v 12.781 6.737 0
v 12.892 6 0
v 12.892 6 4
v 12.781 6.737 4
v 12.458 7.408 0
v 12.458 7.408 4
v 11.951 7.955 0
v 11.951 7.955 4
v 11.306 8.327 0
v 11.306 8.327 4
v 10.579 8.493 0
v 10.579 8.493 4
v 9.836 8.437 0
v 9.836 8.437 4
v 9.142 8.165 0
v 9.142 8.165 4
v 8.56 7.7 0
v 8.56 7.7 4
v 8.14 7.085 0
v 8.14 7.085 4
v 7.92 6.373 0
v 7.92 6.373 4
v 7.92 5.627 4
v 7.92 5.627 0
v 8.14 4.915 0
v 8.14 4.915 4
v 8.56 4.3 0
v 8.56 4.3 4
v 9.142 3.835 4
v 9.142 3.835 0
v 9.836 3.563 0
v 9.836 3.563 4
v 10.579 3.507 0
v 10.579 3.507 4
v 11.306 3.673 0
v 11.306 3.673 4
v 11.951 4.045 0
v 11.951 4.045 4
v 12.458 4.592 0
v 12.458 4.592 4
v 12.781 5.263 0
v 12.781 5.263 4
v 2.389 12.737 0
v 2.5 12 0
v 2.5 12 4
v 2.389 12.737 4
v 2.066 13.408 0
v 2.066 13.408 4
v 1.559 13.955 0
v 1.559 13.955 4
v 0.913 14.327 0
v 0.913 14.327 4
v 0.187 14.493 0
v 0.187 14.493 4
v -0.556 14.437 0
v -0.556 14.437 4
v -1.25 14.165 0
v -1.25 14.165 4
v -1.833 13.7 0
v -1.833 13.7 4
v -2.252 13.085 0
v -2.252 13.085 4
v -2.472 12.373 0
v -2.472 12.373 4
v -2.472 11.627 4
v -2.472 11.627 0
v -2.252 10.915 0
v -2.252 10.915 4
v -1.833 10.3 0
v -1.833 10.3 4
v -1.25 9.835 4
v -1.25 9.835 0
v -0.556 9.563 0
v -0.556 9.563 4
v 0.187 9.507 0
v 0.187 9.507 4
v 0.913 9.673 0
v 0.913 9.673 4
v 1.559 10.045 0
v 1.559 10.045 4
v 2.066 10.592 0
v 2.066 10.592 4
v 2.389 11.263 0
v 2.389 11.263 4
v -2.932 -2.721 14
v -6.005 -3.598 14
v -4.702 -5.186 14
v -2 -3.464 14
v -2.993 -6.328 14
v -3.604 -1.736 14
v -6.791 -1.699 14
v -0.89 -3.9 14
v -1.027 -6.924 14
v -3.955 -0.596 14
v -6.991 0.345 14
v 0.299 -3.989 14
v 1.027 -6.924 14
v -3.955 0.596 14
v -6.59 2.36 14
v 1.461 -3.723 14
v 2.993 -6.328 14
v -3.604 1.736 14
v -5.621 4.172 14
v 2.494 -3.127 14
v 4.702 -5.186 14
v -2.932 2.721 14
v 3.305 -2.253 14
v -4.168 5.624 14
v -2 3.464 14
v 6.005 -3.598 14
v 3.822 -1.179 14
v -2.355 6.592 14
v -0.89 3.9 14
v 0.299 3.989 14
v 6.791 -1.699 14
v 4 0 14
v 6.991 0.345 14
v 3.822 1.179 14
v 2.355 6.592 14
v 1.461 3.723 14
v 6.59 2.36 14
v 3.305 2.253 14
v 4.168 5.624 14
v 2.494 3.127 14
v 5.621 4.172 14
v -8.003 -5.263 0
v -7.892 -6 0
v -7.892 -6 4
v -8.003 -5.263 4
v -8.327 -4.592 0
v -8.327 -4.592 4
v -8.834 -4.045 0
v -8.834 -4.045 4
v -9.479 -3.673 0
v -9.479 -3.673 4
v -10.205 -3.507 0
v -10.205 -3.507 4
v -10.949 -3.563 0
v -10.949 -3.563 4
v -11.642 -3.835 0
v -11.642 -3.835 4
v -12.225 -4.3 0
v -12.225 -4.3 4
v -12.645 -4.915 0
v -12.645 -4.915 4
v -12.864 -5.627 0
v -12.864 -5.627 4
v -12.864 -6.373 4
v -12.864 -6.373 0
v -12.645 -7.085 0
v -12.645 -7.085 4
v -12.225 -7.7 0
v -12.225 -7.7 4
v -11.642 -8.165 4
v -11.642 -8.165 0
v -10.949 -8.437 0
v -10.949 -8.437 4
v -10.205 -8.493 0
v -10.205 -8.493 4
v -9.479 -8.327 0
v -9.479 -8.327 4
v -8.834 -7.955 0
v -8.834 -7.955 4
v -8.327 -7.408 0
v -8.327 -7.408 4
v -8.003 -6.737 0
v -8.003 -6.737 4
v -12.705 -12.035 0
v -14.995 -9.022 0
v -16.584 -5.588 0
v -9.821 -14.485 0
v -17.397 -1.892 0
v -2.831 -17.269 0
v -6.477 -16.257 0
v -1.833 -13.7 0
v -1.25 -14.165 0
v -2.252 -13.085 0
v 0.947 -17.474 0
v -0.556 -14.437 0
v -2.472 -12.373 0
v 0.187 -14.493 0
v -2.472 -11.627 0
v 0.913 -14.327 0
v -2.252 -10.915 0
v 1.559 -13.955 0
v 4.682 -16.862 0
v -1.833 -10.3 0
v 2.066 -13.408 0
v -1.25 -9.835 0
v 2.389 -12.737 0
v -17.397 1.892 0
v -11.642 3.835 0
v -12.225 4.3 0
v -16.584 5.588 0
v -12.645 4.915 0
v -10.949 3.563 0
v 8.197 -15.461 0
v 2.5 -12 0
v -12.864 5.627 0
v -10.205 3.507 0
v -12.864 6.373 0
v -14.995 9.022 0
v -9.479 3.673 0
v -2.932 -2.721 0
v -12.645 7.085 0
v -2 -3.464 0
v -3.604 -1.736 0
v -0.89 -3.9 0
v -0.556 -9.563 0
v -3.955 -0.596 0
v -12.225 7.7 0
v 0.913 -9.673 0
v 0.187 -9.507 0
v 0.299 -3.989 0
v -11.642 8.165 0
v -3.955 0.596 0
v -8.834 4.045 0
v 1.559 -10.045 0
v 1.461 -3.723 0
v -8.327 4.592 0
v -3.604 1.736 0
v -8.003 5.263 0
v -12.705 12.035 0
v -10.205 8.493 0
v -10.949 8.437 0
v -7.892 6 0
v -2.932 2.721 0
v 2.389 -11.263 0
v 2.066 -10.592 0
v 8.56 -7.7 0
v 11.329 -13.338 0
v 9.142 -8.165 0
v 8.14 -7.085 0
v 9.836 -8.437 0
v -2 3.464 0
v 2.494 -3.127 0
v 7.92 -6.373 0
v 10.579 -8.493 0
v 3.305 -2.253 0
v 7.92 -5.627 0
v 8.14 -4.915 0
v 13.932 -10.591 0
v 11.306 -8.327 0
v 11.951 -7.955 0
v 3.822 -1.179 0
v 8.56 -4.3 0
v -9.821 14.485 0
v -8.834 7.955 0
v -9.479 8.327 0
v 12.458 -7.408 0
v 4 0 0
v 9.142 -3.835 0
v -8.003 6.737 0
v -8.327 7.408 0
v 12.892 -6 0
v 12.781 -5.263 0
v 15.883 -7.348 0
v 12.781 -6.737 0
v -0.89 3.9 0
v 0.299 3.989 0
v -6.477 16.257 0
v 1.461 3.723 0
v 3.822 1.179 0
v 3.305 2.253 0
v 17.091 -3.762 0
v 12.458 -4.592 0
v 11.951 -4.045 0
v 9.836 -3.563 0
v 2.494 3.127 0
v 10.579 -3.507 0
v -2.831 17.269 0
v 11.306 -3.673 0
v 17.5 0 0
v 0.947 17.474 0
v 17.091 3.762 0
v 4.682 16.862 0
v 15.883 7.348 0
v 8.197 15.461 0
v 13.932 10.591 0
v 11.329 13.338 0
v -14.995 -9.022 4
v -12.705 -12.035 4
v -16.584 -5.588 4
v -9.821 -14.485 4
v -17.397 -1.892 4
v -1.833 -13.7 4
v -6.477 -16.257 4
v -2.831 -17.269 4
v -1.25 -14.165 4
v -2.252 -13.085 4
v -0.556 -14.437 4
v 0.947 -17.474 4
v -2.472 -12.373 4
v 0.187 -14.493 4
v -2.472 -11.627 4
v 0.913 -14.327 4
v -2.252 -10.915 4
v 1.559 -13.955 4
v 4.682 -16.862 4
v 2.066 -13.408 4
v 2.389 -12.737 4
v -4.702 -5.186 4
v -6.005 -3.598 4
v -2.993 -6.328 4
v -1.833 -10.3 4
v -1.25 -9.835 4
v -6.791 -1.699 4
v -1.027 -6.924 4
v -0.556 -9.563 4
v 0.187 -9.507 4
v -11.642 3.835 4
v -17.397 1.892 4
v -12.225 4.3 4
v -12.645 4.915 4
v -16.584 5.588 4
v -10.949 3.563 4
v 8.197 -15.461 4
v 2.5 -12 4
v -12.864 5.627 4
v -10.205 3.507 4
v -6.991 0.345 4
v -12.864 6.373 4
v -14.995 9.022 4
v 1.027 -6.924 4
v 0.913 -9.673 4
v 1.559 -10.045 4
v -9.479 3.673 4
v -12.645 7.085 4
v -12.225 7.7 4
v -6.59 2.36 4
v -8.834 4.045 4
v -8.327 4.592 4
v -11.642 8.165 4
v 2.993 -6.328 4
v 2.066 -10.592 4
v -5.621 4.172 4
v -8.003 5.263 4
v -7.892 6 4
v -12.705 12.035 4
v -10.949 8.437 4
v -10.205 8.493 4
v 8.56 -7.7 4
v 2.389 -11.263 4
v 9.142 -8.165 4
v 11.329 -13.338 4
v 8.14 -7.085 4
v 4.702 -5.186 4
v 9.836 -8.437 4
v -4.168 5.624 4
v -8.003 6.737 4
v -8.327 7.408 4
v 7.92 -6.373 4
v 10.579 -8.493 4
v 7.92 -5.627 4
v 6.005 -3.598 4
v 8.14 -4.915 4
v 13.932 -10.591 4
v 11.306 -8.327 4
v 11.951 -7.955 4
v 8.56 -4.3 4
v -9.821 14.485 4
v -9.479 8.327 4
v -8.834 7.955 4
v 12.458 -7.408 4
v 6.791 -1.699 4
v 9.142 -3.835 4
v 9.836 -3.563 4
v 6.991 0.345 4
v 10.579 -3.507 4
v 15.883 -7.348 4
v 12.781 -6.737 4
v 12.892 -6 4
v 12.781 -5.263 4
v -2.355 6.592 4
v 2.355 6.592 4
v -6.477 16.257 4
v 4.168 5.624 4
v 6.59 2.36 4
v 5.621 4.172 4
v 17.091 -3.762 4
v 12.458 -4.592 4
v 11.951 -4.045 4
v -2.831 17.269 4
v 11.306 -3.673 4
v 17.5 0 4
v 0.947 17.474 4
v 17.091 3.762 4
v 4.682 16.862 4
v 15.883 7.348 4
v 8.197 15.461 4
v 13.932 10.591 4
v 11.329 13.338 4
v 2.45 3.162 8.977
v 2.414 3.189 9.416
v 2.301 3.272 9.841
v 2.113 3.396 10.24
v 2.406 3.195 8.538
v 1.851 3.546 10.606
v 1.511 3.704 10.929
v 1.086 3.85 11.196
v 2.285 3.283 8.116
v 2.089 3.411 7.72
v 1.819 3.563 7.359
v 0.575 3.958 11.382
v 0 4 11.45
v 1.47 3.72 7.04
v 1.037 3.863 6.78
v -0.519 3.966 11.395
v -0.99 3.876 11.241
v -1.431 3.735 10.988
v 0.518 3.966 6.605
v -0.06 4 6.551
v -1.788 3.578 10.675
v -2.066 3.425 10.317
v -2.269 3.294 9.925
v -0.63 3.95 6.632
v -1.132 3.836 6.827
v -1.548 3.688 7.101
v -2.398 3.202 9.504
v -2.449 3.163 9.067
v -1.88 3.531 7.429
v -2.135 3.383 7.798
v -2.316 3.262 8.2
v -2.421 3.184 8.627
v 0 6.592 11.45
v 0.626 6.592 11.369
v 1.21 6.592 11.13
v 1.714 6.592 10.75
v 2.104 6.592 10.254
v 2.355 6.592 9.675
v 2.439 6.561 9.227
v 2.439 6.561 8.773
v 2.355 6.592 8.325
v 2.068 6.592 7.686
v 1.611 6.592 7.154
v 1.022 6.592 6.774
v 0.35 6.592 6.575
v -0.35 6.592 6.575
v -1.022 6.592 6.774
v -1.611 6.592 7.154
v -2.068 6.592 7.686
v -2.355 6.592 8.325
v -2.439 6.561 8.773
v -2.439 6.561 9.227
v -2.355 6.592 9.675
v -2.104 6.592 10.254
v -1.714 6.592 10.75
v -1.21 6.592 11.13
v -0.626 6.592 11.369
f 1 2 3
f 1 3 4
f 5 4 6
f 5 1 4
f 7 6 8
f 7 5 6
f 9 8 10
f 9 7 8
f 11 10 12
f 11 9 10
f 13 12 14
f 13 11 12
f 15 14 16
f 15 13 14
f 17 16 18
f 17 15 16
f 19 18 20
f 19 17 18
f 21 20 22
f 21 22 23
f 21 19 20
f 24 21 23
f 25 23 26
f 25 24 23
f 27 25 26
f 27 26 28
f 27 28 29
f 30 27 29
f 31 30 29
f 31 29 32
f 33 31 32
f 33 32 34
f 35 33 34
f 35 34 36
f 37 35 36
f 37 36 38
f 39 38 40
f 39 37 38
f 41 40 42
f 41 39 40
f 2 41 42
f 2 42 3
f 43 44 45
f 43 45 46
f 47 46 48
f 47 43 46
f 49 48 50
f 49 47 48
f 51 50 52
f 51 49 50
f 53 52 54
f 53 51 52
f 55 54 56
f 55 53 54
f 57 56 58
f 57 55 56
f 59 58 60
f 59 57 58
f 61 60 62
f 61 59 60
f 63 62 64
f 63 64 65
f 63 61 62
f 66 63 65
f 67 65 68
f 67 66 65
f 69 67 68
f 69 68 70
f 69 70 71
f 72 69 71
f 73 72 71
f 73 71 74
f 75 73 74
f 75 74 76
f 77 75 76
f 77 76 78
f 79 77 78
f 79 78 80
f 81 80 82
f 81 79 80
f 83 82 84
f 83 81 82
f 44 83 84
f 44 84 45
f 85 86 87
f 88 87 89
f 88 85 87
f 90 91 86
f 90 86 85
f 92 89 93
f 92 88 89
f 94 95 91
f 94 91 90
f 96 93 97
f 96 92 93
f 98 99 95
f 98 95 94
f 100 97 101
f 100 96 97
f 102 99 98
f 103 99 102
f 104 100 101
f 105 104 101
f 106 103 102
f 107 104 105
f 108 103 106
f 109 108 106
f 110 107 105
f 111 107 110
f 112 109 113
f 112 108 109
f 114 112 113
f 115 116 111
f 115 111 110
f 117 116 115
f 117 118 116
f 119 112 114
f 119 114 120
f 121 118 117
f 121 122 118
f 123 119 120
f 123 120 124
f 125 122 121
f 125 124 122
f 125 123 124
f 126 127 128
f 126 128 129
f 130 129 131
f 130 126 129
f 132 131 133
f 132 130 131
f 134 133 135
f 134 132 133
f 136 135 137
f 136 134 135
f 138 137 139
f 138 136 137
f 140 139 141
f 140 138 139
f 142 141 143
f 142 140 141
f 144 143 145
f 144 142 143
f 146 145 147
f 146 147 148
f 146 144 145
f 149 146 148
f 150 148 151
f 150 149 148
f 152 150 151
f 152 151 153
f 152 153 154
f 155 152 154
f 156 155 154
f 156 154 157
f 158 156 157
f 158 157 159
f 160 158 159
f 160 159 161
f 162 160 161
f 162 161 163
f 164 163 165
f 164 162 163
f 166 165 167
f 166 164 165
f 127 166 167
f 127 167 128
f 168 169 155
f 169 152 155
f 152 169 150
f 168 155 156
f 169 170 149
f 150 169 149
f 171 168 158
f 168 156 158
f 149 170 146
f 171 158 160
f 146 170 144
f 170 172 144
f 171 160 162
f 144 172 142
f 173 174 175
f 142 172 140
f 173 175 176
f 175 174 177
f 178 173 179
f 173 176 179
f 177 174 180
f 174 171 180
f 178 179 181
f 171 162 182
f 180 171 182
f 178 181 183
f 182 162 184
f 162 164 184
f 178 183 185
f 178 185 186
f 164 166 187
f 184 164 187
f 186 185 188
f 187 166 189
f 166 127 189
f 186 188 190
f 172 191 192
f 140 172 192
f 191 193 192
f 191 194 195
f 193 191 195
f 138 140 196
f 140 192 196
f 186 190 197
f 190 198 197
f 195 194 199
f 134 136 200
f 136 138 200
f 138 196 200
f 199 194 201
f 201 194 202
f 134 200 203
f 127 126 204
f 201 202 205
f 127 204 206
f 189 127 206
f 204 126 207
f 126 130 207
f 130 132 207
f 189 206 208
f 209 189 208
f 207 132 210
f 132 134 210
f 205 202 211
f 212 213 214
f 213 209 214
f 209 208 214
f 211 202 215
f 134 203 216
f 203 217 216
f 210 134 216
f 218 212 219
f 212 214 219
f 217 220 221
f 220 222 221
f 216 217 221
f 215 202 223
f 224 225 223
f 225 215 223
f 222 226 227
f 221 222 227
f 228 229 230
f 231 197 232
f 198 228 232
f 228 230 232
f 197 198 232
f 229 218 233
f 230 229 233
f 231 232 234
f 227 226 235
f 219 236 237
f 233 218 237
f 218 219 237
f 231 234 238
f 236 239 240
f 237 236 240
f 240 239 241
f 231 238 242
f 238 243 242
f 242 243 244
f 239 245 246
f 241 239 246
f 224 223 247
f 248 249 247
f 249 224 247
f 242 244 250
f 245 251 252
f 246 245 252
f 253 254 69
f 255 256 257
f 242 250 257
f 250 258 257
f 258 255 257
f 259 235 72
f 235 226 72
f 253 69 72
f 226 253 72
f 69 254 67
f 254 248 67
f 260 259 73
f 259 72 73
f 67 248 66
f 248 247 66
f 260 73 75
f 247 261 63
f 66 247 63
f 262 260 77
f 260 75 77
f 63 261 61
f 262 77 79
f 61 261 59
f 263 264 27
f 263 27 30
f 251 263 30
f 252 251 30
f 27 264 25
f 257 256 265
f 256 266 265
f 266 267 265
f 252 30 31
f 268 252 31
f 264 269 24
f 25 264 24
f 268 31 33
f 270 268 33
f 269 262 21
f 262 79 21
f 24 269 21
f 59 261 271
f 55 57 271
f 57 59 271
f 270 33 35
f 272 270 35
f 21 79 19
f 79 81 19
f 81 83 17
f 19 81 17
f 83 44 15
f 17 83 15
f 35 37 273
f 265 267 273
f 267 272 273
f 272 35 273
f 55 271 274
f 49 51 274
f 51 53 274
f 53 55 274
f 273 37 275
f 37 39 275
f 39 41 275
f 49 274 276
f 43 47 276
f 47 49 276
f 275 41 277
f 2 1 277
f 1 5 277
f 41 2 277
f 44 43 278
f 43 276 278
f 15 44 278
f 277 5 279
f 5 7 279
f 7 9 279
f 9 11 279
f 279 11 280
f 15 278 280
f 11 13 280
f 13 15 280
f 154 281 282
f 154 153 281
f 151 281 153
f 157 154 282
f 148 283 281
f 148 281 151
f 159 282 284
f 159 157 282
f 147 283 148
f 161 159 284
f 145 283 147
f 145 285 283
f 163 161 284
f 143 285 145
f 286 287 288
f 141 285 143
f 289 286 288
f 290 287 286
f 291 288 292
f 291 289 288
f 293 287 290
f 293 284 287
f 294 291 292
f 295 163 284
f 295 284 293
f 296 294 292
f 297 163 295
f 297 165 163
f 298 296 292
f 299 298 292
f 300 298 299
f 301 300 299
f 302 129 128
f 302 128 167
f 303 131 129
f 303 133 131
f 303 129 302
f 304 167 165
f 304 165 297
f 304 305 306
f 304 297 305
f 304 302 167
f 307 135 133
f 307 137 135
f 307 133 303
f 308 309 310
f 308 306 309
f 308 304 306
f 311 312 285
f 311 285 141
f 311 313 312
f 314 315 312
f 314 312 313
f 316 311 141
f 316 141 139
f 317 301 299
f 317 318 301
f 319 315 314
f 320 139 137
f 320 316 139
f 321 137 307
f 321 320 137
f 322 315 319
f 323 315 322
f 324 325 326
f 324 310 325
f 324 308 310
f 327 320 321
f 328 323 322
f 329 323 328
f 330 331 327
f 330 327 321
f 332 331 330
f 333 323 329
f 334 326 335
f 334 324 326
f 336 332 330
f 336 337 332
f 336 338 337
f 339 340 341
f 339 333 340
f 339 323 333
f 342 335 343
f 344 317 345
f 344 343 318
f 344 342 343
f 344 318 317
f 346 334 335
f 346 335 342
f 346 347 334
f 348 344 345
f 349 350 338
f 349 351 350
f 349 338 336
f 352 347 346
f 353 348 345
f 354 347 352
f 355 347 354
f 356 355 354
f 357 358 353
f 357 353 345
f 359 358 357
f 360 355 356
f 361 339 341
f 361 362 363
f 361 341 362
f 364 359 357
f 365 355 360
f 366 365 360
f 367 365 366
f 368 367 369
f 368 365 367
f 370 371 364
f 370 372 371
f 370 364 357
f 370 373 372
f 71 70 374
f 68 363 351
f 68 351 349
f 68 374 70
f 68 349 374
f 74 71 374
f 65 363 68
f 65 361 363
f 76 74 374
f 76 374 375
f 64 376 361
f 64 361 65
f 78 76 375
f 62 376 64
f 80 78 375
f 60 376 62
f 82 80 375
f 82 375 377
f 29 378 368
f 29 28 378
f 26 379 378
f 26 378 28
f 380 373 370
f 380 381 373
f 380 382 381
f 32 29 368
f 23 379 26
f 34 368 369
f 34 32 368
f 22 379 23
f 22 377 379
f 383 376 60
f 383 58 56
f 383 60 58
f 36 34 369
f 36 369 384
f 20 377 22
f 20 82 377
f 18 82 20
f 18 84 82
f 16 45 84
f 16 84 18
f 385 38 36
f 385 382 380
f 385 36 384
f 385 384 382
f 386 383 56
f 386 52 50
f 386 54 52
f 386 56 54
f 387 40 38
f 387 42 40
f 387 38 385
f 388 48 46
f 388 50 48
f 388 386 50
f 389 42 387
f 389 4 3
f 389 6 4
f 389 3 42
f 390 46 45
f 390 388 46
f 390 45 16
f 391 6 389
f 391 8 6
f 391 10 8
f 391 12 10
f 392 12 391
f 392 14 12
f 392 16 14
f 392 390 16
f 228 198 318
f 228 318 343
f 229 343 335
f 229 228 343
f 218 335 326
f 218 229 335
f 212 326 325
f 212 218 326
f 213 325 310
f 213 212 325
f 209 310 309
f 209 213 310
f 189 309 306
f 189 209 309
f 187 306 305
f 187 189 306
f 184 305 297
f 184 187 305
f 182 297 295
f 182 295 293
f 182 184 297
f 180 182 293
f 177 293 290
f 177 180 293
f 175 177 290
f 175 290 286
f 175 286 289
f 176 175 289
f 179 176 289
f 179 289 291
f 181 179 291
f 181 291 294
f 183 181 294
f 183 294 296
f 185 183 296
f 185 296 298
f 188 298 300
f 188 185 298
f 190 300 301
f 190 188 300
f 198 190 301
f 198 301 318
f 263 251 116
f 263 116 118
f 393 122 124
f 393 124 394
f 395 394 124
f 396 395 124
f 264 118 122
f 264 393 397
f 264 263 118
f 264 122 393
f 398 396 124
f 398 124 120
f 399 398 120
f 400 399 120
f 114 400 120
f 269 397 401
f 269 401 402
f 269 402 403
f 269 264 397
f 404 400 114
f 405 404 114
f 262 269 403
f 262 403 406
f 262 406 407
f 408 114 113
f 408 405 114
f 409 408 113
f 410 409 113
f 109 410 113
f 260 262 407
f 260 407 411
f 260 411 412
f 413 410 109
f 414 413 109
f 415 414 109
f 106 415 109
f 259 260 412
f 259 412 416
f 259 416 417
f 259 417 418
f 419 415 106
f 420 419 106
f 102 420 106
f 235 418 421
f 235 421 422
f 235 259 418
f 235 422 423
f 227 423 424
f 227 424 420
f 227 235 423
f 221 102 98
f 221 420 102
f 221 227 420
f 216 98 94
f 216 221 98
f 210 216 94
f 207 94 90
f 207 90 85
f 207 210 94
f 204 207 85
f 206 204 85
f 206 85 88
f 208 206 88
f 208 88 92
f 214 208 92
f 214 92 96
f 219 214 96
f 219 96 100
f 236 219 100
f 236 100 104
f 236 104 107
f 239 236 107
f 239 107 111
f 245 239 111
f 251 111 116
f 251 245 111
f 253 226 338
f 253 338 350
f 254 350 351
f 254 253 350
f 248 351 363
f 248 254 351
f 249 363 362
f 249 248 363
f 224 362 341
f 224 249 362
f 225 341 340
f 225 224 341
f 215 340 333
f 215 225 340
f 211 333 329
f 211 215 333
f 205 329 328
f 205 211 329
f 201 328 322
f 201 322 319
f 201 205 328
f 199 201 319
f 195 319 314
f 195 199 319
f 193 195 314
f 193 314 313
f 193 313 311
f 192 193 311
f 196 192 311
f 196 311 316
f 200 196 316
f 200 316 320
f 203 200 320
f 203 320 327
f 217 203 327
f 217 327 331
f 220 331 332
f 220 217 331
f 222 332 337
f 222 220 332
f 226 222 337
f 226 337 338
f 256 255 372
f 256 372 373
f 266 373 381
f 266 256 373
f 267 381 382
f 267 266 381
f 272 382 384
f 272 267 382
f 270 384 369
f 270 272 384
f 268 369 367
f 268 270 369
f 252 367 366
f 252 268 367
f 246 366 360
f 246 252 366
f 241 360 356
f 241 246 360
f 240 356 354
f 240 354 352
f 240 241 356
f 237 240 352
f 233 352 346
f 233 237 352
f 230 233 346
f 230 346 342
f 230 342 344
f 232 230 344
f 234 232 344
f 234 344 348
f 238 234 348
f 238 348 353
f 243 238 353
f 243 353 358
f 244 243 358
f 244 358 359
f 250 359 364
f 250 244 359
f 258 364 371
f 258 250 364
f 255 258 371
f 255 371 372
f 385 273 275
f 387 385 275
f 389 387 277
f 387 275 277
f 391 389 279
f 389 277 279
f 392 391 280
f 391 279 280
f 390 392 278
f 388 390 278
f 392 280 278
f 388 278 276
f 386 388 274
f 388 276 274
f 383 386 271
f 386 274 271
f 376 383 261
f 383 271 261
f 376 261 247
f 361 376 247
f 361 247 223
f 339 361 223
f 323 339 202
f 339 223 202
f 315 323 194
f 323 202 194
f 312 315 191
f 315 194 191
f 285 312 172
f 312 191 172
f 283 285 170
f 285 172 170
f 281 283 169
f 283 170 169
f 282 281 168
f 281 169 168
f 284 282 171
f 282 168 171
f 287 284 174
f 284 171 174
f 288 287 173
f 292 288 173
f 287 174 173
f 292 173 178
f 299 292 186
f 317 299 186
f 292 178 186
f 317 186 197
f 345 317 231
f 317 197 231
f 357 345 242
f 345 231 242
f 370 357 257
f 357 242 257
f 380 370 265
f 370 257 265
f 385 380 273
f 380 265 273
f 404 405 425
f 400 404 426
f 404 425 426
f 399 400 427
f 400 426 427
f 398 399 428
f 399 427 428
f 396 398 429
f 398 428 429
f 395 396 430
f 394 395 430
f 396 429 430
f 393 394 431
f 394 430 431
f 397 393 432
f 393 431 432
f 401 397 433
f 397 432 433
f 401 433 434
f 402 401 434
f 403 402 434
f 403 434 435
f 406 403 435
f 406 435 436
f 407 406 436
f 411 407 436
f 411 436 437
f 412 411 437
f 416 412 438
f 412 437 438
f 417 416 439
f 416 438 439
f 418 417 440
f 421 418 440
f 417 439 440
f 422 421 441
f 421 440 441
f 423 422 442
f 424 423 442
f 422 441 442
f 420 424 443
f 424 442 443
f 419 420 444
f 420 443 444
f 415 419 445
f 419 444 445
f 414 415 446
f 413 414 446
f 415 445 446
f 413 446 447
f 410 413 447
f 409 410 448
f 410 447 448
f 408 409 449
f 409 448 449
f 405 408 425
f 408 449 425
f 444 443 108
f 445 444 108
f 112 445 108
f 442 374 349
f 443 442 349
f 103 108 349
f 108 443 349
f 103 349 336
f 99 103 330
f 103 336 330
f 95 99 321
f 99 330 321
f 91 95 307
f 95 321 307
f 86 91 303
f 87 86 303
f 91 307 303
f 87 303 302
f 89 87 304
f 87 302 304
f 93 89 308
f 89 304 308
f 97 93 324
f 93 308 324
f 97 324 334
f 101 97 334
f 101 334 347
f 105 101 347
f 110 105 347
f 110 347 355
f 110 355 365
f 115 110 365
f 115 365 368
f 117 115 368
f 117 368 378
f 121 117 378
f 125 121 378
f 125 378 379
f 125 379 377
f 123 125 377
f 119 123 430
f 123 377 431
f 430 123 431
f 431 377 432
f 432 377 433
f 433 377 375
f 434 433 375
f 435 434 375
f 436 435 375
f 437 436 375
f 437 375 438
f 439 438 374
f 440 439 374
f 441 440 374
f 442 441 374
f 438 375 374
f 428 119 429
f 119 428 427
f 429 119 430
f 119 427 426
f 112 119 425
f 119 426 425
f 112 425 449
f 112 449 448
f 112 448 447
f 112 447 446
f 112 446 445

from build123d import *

# Parameters (mm, degrees)
SKETCH1_R           = 17.5
SKETCH1_R_2         = 2.5
SKETCH1_R_3         = 4
BOSS_EXTRUDE1_DEPTH = 4
SKETCH3_R           = 4
BOSS_EXTRUDE2_DEPTH = 10
SKETCH4_R           = 2.45
CUT_EXTRUDE1_DEPTH  = 4


with BuildPart() as part:
    # Sketch1 → Boss-Extrude1 (new body)
    with BuildSketch(Plane.XY):
        Circle(SKETCH1_R)
        with Locations((0, 12)):
            Circle(SKETCH1_R_2, mode=Mode.SUBTRACT)
        with Locations((10.392304845, 6)):
            Circle(SKETCH1_R_2, mode=Mode.SUBTRACT)
        with Locations((10.392304845, -6)):
            Circle(SKETCH1_R_2, mode=Mode.SUBTRACT)
        with Locations((0, -12)):
            Circle(SKETCH1_R_2, mode=Mode.SUBTRACT)
        with Locations((-10.392304845, -6)):
            Circle(SKETCH1_R_2, mode=Mode.SUBTRACT)
        with Locations((-10.392304845, 6)):
            Circle(SKETCH1_R_2, mode=Mode.SUBTRACT)
        Circle(SKETCH1_R_3, mode=Mode.SUBTRACT)
    extrude(amount=BOSS_EXTRUDE1_DEPTH)

    # Sketch3 → Boss-Extrude2 (add)
    with BuildSketch(Plane.XY.offset(4)):
        with BuildLine():
            Line((2.355105774, 6.591925121), (-2.355105774, 6.591925121))
            ThreePointArc((-2.355105774, 6.591925121), (0, -7), (2.355105774, 6.591925121))
        make_face()
        Circle(SKETCH3_R, mode=Mode.SUBTRACT)
    extrude(amount=BOSS_EXTRUDE2_DEPTH)

    # Sketch4 → Cut-Extrude1 (cut)
    with BuildSketch(Plane(origin=(0, 6.591925121, 0), x_dir=(1, 0, 0), z_dir=(0, 1, 0))):
        with Locations(Location((0, -9, 0), (0, 0, 270))):
            Circle(SKETCH4_R)
    extrude(amount=-CUT_EXTRUDE1_DEPTH, mode=Mode.SUBTRACT)


solid = part.part
